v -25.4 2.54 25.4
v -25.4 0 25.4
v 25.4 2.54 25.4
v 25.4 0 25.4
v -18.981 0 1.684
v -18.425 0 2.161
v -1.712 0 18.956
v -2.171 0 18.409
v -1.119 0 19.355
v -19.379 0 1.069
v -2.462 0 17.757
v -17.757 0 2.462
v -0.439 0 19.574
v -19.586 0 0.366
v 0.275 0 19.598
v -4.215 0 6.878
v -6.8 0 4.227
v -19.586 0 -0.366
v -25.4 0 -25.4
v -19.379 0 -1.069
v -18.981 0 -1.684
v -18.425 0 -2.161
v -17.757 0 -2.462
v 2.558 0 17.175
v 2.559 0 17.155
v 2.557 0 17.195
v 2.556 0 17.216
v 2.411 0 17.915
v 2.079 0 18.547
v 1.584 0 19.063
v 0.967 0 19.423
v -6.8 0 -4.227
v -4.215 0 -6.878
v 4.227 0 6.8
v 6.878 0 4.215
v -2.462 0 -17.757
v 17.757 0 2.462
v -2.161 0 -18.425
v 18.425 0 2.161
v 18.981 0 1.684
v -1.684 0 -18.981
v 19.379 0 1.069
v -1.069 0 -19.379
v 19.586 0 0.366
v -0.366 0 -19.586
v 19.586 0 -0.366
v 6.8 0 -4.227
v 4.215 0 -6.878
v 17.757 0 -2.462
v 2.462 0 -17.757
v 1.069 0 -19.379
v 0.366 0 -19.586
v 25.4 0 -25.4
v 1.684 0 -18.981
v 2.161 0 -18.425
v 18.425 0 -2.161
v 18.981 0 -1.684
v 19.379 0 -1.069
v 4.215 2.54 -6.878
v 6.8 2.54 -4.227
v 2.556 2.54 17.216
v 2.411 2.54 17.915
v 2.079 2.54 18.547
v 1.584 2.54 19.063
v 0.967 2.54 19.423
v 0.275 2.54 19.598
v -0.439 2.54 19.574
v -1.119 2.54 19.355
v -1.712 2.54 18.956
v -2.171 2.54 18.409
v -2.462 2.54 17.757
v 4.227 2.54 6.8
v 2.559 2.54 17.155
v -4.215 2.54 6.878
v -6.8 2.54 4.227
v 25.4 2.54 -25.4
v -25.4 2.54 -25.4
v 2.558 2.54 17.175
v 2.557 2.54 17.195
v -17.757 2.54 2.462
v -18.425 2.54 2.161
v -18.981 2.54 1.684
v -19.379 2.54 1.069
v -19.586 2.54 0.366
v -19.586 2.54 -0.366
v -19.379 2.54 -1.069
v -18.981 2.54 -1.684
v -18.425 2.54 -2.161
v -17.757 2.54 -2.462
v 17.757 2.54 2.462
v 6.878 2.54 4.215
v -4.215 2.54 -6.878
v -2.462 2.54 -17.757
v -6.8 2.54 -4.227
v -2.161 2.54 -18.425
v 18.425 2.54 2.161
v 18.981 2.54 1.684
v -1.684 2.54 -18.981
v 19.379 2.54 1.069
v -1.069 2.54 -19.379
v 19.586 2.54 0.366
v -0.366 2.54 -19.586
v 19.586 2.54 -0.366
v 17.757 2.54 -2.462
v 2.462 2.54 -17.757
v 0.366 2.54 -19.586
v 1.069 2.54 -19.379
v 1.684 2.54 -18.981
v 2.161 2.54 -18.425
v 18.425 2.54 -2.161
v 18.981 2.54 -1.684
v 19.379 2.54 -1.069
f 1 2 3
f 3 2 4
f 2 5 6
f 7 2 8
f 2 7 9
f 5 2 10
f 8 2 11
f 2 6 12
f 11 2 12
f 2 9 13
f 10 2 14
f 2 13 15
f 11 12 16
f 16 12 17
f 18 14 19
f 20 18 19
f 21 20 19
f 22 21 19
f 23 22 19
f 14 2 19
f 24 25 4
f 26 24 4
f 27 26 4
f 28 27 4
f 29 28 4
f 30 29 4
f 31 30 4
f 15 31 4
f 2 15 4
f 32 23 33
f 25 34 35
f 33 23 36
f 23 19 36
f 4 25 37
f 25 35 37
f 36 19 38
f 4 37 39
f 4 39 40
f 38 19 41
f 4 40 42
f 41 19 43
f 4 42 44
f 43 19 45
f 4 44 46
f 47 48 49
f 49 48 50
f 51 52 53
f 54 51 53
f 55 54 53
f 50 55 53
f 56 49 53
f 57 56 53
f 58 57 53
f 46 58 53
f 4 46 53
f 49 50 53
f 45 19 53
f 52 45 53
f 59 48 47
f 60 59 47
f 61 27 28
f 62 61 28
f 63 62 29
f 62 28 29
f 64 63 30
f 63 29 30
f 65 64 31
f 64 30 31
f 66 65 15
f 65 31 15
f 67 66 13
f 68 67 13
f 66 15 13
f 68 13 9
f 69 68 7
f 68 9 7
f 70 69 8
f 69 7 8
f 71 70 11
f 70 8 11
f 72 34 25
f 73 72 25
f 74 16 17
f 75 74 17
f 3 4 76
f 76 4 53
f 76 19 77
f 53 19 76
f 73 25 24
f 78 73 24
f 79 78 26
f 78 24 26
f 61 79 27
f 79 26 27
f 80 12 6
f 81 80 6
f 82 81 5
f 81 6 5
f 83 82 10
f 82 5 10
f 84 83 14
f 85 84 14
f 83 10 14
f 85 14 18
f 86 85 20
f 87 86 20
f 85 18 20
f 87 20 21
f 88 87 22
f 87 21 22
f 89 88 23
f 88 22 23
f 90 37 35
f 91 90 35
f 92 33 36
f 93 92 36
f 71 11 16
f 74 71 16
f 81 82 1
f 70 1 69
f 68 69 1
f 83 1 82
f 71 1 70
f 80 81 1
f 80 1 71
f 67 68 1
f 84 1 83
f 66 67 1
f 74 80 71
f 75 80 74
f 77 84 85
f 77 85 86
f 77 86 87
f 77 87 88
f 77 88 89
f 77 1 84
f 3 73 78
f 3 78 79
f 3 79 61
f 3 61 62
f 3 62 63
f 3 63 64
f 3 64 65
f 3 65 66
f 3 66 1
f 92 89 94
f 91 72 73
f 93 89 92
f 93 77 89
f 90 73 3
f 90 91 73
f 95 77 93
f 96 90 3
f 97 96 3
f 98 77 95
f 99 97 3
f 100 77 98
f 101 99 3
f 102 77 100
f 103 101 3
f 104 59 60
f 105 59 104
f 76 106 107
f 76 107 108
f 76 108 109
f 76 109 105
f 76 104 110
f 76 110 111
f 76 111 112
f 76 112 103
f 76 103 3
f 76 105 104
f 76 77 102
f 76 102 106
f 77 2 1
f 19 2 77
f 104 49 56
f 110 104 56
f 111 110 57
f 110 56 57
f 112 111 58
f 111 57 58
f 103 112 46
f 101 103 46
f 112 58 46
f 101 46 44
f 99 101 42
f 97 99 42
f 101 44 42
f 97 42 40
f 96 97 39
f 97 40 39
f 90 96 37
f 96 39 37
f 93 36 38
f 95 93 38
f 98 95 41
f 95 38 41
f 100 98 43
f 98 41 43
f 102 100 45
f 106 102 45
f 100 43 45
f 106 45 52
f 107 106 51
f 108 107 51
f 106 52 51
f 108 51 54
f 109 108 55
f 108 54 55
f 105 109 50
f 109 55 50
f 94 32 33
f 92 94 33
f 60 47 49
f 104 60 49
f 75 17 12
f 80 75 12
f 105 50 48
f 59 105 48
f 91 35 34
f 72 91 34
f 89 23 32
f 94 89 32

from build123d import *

# Parameters (mm, degrees)
SKETCH1_W           = 50.8
SKETCH1_H           = 50.8
BOSS_EXTRUDE1_DEPTH = 2.54
CUT_EXTRUDE2_DEPTH  = 2.54


with BuildPart() as part:
    # Sketch1 → Boss-Extrude1 (new body)
    with BuildSketch(Plane(origin=(0, 0, 0), x_dir=(1, 0, 0), z_dir=(0, 1, 0))):
        Rectangle(SKETCH1_W, SKETCH1_H)
    extrude(amount=BOSS_EXTRUDE1_DEPTH)

    # Sketch2 → Cut-Extrude2 (cut)
    with BuildSketch(Plane.XZ):
        with BuildLine():
            Line((-4.214616619, 6.877540553), (-6.799823365, 4.227137698))
            Line((-6.799823365, 4.227137698), (-17.756833433, 2.46184495))
            ThreePointArc((-17.756833433, 2.46184495), (-19.612357967, 0), (-17.756833433, -2.46184495))
            Line((-17.756833433, -2.46184495), (-6.799823365, -4.227137698))
            Line((-6.799823365, -4.227137698), (-4.214616619, -6.877540553))
            Line((-4.214616619, -6.877540553), (-2.46184495, -17.756833433))
            ThreePointArc((-2.46184495, -17.756833433), (0, -19.612357967), (2.46184495, -17.756833433))
            Line((2.46184495, -17.756833433), (4.214616619, -6.877540553))
            Line((4.214616619, -6.877540553), (6.799823365, -4.227137698))
            Line((6.799823365, -4.227137698), (17.756833433, -2.46184495))
            ThreePointArc((17.756833433, -2.46184495), (19.612357967, 0), (17.756833433, 2.46184495))
            Line((17.756833433, 2.46184495), (6.877540553, 4.214616619))
            Line((6.877540553, 4.214616619), (4.227137698, 6.799823365))
            Line((4.227137698, 6.799823365), (2.558814736, 17.15495087))
            ThreePointArc((2.558814736, 17.15495087), (2.557405809, 17.185318827), (2.555636489, 17.21566792))
            ThreePointArc((2.555636489, 17.21566792), (0.274616535, 19.597591266), (-2.46184495, 17.756833433))
            Line((-2.46184495, 17.756833433), (-4.214616619, 6.877540553))
        make_face()
    extrude(amount=-CUT_EXTRUDE2_DEPTH, mode=Mode.SUBTRACT)


solid = part.part
